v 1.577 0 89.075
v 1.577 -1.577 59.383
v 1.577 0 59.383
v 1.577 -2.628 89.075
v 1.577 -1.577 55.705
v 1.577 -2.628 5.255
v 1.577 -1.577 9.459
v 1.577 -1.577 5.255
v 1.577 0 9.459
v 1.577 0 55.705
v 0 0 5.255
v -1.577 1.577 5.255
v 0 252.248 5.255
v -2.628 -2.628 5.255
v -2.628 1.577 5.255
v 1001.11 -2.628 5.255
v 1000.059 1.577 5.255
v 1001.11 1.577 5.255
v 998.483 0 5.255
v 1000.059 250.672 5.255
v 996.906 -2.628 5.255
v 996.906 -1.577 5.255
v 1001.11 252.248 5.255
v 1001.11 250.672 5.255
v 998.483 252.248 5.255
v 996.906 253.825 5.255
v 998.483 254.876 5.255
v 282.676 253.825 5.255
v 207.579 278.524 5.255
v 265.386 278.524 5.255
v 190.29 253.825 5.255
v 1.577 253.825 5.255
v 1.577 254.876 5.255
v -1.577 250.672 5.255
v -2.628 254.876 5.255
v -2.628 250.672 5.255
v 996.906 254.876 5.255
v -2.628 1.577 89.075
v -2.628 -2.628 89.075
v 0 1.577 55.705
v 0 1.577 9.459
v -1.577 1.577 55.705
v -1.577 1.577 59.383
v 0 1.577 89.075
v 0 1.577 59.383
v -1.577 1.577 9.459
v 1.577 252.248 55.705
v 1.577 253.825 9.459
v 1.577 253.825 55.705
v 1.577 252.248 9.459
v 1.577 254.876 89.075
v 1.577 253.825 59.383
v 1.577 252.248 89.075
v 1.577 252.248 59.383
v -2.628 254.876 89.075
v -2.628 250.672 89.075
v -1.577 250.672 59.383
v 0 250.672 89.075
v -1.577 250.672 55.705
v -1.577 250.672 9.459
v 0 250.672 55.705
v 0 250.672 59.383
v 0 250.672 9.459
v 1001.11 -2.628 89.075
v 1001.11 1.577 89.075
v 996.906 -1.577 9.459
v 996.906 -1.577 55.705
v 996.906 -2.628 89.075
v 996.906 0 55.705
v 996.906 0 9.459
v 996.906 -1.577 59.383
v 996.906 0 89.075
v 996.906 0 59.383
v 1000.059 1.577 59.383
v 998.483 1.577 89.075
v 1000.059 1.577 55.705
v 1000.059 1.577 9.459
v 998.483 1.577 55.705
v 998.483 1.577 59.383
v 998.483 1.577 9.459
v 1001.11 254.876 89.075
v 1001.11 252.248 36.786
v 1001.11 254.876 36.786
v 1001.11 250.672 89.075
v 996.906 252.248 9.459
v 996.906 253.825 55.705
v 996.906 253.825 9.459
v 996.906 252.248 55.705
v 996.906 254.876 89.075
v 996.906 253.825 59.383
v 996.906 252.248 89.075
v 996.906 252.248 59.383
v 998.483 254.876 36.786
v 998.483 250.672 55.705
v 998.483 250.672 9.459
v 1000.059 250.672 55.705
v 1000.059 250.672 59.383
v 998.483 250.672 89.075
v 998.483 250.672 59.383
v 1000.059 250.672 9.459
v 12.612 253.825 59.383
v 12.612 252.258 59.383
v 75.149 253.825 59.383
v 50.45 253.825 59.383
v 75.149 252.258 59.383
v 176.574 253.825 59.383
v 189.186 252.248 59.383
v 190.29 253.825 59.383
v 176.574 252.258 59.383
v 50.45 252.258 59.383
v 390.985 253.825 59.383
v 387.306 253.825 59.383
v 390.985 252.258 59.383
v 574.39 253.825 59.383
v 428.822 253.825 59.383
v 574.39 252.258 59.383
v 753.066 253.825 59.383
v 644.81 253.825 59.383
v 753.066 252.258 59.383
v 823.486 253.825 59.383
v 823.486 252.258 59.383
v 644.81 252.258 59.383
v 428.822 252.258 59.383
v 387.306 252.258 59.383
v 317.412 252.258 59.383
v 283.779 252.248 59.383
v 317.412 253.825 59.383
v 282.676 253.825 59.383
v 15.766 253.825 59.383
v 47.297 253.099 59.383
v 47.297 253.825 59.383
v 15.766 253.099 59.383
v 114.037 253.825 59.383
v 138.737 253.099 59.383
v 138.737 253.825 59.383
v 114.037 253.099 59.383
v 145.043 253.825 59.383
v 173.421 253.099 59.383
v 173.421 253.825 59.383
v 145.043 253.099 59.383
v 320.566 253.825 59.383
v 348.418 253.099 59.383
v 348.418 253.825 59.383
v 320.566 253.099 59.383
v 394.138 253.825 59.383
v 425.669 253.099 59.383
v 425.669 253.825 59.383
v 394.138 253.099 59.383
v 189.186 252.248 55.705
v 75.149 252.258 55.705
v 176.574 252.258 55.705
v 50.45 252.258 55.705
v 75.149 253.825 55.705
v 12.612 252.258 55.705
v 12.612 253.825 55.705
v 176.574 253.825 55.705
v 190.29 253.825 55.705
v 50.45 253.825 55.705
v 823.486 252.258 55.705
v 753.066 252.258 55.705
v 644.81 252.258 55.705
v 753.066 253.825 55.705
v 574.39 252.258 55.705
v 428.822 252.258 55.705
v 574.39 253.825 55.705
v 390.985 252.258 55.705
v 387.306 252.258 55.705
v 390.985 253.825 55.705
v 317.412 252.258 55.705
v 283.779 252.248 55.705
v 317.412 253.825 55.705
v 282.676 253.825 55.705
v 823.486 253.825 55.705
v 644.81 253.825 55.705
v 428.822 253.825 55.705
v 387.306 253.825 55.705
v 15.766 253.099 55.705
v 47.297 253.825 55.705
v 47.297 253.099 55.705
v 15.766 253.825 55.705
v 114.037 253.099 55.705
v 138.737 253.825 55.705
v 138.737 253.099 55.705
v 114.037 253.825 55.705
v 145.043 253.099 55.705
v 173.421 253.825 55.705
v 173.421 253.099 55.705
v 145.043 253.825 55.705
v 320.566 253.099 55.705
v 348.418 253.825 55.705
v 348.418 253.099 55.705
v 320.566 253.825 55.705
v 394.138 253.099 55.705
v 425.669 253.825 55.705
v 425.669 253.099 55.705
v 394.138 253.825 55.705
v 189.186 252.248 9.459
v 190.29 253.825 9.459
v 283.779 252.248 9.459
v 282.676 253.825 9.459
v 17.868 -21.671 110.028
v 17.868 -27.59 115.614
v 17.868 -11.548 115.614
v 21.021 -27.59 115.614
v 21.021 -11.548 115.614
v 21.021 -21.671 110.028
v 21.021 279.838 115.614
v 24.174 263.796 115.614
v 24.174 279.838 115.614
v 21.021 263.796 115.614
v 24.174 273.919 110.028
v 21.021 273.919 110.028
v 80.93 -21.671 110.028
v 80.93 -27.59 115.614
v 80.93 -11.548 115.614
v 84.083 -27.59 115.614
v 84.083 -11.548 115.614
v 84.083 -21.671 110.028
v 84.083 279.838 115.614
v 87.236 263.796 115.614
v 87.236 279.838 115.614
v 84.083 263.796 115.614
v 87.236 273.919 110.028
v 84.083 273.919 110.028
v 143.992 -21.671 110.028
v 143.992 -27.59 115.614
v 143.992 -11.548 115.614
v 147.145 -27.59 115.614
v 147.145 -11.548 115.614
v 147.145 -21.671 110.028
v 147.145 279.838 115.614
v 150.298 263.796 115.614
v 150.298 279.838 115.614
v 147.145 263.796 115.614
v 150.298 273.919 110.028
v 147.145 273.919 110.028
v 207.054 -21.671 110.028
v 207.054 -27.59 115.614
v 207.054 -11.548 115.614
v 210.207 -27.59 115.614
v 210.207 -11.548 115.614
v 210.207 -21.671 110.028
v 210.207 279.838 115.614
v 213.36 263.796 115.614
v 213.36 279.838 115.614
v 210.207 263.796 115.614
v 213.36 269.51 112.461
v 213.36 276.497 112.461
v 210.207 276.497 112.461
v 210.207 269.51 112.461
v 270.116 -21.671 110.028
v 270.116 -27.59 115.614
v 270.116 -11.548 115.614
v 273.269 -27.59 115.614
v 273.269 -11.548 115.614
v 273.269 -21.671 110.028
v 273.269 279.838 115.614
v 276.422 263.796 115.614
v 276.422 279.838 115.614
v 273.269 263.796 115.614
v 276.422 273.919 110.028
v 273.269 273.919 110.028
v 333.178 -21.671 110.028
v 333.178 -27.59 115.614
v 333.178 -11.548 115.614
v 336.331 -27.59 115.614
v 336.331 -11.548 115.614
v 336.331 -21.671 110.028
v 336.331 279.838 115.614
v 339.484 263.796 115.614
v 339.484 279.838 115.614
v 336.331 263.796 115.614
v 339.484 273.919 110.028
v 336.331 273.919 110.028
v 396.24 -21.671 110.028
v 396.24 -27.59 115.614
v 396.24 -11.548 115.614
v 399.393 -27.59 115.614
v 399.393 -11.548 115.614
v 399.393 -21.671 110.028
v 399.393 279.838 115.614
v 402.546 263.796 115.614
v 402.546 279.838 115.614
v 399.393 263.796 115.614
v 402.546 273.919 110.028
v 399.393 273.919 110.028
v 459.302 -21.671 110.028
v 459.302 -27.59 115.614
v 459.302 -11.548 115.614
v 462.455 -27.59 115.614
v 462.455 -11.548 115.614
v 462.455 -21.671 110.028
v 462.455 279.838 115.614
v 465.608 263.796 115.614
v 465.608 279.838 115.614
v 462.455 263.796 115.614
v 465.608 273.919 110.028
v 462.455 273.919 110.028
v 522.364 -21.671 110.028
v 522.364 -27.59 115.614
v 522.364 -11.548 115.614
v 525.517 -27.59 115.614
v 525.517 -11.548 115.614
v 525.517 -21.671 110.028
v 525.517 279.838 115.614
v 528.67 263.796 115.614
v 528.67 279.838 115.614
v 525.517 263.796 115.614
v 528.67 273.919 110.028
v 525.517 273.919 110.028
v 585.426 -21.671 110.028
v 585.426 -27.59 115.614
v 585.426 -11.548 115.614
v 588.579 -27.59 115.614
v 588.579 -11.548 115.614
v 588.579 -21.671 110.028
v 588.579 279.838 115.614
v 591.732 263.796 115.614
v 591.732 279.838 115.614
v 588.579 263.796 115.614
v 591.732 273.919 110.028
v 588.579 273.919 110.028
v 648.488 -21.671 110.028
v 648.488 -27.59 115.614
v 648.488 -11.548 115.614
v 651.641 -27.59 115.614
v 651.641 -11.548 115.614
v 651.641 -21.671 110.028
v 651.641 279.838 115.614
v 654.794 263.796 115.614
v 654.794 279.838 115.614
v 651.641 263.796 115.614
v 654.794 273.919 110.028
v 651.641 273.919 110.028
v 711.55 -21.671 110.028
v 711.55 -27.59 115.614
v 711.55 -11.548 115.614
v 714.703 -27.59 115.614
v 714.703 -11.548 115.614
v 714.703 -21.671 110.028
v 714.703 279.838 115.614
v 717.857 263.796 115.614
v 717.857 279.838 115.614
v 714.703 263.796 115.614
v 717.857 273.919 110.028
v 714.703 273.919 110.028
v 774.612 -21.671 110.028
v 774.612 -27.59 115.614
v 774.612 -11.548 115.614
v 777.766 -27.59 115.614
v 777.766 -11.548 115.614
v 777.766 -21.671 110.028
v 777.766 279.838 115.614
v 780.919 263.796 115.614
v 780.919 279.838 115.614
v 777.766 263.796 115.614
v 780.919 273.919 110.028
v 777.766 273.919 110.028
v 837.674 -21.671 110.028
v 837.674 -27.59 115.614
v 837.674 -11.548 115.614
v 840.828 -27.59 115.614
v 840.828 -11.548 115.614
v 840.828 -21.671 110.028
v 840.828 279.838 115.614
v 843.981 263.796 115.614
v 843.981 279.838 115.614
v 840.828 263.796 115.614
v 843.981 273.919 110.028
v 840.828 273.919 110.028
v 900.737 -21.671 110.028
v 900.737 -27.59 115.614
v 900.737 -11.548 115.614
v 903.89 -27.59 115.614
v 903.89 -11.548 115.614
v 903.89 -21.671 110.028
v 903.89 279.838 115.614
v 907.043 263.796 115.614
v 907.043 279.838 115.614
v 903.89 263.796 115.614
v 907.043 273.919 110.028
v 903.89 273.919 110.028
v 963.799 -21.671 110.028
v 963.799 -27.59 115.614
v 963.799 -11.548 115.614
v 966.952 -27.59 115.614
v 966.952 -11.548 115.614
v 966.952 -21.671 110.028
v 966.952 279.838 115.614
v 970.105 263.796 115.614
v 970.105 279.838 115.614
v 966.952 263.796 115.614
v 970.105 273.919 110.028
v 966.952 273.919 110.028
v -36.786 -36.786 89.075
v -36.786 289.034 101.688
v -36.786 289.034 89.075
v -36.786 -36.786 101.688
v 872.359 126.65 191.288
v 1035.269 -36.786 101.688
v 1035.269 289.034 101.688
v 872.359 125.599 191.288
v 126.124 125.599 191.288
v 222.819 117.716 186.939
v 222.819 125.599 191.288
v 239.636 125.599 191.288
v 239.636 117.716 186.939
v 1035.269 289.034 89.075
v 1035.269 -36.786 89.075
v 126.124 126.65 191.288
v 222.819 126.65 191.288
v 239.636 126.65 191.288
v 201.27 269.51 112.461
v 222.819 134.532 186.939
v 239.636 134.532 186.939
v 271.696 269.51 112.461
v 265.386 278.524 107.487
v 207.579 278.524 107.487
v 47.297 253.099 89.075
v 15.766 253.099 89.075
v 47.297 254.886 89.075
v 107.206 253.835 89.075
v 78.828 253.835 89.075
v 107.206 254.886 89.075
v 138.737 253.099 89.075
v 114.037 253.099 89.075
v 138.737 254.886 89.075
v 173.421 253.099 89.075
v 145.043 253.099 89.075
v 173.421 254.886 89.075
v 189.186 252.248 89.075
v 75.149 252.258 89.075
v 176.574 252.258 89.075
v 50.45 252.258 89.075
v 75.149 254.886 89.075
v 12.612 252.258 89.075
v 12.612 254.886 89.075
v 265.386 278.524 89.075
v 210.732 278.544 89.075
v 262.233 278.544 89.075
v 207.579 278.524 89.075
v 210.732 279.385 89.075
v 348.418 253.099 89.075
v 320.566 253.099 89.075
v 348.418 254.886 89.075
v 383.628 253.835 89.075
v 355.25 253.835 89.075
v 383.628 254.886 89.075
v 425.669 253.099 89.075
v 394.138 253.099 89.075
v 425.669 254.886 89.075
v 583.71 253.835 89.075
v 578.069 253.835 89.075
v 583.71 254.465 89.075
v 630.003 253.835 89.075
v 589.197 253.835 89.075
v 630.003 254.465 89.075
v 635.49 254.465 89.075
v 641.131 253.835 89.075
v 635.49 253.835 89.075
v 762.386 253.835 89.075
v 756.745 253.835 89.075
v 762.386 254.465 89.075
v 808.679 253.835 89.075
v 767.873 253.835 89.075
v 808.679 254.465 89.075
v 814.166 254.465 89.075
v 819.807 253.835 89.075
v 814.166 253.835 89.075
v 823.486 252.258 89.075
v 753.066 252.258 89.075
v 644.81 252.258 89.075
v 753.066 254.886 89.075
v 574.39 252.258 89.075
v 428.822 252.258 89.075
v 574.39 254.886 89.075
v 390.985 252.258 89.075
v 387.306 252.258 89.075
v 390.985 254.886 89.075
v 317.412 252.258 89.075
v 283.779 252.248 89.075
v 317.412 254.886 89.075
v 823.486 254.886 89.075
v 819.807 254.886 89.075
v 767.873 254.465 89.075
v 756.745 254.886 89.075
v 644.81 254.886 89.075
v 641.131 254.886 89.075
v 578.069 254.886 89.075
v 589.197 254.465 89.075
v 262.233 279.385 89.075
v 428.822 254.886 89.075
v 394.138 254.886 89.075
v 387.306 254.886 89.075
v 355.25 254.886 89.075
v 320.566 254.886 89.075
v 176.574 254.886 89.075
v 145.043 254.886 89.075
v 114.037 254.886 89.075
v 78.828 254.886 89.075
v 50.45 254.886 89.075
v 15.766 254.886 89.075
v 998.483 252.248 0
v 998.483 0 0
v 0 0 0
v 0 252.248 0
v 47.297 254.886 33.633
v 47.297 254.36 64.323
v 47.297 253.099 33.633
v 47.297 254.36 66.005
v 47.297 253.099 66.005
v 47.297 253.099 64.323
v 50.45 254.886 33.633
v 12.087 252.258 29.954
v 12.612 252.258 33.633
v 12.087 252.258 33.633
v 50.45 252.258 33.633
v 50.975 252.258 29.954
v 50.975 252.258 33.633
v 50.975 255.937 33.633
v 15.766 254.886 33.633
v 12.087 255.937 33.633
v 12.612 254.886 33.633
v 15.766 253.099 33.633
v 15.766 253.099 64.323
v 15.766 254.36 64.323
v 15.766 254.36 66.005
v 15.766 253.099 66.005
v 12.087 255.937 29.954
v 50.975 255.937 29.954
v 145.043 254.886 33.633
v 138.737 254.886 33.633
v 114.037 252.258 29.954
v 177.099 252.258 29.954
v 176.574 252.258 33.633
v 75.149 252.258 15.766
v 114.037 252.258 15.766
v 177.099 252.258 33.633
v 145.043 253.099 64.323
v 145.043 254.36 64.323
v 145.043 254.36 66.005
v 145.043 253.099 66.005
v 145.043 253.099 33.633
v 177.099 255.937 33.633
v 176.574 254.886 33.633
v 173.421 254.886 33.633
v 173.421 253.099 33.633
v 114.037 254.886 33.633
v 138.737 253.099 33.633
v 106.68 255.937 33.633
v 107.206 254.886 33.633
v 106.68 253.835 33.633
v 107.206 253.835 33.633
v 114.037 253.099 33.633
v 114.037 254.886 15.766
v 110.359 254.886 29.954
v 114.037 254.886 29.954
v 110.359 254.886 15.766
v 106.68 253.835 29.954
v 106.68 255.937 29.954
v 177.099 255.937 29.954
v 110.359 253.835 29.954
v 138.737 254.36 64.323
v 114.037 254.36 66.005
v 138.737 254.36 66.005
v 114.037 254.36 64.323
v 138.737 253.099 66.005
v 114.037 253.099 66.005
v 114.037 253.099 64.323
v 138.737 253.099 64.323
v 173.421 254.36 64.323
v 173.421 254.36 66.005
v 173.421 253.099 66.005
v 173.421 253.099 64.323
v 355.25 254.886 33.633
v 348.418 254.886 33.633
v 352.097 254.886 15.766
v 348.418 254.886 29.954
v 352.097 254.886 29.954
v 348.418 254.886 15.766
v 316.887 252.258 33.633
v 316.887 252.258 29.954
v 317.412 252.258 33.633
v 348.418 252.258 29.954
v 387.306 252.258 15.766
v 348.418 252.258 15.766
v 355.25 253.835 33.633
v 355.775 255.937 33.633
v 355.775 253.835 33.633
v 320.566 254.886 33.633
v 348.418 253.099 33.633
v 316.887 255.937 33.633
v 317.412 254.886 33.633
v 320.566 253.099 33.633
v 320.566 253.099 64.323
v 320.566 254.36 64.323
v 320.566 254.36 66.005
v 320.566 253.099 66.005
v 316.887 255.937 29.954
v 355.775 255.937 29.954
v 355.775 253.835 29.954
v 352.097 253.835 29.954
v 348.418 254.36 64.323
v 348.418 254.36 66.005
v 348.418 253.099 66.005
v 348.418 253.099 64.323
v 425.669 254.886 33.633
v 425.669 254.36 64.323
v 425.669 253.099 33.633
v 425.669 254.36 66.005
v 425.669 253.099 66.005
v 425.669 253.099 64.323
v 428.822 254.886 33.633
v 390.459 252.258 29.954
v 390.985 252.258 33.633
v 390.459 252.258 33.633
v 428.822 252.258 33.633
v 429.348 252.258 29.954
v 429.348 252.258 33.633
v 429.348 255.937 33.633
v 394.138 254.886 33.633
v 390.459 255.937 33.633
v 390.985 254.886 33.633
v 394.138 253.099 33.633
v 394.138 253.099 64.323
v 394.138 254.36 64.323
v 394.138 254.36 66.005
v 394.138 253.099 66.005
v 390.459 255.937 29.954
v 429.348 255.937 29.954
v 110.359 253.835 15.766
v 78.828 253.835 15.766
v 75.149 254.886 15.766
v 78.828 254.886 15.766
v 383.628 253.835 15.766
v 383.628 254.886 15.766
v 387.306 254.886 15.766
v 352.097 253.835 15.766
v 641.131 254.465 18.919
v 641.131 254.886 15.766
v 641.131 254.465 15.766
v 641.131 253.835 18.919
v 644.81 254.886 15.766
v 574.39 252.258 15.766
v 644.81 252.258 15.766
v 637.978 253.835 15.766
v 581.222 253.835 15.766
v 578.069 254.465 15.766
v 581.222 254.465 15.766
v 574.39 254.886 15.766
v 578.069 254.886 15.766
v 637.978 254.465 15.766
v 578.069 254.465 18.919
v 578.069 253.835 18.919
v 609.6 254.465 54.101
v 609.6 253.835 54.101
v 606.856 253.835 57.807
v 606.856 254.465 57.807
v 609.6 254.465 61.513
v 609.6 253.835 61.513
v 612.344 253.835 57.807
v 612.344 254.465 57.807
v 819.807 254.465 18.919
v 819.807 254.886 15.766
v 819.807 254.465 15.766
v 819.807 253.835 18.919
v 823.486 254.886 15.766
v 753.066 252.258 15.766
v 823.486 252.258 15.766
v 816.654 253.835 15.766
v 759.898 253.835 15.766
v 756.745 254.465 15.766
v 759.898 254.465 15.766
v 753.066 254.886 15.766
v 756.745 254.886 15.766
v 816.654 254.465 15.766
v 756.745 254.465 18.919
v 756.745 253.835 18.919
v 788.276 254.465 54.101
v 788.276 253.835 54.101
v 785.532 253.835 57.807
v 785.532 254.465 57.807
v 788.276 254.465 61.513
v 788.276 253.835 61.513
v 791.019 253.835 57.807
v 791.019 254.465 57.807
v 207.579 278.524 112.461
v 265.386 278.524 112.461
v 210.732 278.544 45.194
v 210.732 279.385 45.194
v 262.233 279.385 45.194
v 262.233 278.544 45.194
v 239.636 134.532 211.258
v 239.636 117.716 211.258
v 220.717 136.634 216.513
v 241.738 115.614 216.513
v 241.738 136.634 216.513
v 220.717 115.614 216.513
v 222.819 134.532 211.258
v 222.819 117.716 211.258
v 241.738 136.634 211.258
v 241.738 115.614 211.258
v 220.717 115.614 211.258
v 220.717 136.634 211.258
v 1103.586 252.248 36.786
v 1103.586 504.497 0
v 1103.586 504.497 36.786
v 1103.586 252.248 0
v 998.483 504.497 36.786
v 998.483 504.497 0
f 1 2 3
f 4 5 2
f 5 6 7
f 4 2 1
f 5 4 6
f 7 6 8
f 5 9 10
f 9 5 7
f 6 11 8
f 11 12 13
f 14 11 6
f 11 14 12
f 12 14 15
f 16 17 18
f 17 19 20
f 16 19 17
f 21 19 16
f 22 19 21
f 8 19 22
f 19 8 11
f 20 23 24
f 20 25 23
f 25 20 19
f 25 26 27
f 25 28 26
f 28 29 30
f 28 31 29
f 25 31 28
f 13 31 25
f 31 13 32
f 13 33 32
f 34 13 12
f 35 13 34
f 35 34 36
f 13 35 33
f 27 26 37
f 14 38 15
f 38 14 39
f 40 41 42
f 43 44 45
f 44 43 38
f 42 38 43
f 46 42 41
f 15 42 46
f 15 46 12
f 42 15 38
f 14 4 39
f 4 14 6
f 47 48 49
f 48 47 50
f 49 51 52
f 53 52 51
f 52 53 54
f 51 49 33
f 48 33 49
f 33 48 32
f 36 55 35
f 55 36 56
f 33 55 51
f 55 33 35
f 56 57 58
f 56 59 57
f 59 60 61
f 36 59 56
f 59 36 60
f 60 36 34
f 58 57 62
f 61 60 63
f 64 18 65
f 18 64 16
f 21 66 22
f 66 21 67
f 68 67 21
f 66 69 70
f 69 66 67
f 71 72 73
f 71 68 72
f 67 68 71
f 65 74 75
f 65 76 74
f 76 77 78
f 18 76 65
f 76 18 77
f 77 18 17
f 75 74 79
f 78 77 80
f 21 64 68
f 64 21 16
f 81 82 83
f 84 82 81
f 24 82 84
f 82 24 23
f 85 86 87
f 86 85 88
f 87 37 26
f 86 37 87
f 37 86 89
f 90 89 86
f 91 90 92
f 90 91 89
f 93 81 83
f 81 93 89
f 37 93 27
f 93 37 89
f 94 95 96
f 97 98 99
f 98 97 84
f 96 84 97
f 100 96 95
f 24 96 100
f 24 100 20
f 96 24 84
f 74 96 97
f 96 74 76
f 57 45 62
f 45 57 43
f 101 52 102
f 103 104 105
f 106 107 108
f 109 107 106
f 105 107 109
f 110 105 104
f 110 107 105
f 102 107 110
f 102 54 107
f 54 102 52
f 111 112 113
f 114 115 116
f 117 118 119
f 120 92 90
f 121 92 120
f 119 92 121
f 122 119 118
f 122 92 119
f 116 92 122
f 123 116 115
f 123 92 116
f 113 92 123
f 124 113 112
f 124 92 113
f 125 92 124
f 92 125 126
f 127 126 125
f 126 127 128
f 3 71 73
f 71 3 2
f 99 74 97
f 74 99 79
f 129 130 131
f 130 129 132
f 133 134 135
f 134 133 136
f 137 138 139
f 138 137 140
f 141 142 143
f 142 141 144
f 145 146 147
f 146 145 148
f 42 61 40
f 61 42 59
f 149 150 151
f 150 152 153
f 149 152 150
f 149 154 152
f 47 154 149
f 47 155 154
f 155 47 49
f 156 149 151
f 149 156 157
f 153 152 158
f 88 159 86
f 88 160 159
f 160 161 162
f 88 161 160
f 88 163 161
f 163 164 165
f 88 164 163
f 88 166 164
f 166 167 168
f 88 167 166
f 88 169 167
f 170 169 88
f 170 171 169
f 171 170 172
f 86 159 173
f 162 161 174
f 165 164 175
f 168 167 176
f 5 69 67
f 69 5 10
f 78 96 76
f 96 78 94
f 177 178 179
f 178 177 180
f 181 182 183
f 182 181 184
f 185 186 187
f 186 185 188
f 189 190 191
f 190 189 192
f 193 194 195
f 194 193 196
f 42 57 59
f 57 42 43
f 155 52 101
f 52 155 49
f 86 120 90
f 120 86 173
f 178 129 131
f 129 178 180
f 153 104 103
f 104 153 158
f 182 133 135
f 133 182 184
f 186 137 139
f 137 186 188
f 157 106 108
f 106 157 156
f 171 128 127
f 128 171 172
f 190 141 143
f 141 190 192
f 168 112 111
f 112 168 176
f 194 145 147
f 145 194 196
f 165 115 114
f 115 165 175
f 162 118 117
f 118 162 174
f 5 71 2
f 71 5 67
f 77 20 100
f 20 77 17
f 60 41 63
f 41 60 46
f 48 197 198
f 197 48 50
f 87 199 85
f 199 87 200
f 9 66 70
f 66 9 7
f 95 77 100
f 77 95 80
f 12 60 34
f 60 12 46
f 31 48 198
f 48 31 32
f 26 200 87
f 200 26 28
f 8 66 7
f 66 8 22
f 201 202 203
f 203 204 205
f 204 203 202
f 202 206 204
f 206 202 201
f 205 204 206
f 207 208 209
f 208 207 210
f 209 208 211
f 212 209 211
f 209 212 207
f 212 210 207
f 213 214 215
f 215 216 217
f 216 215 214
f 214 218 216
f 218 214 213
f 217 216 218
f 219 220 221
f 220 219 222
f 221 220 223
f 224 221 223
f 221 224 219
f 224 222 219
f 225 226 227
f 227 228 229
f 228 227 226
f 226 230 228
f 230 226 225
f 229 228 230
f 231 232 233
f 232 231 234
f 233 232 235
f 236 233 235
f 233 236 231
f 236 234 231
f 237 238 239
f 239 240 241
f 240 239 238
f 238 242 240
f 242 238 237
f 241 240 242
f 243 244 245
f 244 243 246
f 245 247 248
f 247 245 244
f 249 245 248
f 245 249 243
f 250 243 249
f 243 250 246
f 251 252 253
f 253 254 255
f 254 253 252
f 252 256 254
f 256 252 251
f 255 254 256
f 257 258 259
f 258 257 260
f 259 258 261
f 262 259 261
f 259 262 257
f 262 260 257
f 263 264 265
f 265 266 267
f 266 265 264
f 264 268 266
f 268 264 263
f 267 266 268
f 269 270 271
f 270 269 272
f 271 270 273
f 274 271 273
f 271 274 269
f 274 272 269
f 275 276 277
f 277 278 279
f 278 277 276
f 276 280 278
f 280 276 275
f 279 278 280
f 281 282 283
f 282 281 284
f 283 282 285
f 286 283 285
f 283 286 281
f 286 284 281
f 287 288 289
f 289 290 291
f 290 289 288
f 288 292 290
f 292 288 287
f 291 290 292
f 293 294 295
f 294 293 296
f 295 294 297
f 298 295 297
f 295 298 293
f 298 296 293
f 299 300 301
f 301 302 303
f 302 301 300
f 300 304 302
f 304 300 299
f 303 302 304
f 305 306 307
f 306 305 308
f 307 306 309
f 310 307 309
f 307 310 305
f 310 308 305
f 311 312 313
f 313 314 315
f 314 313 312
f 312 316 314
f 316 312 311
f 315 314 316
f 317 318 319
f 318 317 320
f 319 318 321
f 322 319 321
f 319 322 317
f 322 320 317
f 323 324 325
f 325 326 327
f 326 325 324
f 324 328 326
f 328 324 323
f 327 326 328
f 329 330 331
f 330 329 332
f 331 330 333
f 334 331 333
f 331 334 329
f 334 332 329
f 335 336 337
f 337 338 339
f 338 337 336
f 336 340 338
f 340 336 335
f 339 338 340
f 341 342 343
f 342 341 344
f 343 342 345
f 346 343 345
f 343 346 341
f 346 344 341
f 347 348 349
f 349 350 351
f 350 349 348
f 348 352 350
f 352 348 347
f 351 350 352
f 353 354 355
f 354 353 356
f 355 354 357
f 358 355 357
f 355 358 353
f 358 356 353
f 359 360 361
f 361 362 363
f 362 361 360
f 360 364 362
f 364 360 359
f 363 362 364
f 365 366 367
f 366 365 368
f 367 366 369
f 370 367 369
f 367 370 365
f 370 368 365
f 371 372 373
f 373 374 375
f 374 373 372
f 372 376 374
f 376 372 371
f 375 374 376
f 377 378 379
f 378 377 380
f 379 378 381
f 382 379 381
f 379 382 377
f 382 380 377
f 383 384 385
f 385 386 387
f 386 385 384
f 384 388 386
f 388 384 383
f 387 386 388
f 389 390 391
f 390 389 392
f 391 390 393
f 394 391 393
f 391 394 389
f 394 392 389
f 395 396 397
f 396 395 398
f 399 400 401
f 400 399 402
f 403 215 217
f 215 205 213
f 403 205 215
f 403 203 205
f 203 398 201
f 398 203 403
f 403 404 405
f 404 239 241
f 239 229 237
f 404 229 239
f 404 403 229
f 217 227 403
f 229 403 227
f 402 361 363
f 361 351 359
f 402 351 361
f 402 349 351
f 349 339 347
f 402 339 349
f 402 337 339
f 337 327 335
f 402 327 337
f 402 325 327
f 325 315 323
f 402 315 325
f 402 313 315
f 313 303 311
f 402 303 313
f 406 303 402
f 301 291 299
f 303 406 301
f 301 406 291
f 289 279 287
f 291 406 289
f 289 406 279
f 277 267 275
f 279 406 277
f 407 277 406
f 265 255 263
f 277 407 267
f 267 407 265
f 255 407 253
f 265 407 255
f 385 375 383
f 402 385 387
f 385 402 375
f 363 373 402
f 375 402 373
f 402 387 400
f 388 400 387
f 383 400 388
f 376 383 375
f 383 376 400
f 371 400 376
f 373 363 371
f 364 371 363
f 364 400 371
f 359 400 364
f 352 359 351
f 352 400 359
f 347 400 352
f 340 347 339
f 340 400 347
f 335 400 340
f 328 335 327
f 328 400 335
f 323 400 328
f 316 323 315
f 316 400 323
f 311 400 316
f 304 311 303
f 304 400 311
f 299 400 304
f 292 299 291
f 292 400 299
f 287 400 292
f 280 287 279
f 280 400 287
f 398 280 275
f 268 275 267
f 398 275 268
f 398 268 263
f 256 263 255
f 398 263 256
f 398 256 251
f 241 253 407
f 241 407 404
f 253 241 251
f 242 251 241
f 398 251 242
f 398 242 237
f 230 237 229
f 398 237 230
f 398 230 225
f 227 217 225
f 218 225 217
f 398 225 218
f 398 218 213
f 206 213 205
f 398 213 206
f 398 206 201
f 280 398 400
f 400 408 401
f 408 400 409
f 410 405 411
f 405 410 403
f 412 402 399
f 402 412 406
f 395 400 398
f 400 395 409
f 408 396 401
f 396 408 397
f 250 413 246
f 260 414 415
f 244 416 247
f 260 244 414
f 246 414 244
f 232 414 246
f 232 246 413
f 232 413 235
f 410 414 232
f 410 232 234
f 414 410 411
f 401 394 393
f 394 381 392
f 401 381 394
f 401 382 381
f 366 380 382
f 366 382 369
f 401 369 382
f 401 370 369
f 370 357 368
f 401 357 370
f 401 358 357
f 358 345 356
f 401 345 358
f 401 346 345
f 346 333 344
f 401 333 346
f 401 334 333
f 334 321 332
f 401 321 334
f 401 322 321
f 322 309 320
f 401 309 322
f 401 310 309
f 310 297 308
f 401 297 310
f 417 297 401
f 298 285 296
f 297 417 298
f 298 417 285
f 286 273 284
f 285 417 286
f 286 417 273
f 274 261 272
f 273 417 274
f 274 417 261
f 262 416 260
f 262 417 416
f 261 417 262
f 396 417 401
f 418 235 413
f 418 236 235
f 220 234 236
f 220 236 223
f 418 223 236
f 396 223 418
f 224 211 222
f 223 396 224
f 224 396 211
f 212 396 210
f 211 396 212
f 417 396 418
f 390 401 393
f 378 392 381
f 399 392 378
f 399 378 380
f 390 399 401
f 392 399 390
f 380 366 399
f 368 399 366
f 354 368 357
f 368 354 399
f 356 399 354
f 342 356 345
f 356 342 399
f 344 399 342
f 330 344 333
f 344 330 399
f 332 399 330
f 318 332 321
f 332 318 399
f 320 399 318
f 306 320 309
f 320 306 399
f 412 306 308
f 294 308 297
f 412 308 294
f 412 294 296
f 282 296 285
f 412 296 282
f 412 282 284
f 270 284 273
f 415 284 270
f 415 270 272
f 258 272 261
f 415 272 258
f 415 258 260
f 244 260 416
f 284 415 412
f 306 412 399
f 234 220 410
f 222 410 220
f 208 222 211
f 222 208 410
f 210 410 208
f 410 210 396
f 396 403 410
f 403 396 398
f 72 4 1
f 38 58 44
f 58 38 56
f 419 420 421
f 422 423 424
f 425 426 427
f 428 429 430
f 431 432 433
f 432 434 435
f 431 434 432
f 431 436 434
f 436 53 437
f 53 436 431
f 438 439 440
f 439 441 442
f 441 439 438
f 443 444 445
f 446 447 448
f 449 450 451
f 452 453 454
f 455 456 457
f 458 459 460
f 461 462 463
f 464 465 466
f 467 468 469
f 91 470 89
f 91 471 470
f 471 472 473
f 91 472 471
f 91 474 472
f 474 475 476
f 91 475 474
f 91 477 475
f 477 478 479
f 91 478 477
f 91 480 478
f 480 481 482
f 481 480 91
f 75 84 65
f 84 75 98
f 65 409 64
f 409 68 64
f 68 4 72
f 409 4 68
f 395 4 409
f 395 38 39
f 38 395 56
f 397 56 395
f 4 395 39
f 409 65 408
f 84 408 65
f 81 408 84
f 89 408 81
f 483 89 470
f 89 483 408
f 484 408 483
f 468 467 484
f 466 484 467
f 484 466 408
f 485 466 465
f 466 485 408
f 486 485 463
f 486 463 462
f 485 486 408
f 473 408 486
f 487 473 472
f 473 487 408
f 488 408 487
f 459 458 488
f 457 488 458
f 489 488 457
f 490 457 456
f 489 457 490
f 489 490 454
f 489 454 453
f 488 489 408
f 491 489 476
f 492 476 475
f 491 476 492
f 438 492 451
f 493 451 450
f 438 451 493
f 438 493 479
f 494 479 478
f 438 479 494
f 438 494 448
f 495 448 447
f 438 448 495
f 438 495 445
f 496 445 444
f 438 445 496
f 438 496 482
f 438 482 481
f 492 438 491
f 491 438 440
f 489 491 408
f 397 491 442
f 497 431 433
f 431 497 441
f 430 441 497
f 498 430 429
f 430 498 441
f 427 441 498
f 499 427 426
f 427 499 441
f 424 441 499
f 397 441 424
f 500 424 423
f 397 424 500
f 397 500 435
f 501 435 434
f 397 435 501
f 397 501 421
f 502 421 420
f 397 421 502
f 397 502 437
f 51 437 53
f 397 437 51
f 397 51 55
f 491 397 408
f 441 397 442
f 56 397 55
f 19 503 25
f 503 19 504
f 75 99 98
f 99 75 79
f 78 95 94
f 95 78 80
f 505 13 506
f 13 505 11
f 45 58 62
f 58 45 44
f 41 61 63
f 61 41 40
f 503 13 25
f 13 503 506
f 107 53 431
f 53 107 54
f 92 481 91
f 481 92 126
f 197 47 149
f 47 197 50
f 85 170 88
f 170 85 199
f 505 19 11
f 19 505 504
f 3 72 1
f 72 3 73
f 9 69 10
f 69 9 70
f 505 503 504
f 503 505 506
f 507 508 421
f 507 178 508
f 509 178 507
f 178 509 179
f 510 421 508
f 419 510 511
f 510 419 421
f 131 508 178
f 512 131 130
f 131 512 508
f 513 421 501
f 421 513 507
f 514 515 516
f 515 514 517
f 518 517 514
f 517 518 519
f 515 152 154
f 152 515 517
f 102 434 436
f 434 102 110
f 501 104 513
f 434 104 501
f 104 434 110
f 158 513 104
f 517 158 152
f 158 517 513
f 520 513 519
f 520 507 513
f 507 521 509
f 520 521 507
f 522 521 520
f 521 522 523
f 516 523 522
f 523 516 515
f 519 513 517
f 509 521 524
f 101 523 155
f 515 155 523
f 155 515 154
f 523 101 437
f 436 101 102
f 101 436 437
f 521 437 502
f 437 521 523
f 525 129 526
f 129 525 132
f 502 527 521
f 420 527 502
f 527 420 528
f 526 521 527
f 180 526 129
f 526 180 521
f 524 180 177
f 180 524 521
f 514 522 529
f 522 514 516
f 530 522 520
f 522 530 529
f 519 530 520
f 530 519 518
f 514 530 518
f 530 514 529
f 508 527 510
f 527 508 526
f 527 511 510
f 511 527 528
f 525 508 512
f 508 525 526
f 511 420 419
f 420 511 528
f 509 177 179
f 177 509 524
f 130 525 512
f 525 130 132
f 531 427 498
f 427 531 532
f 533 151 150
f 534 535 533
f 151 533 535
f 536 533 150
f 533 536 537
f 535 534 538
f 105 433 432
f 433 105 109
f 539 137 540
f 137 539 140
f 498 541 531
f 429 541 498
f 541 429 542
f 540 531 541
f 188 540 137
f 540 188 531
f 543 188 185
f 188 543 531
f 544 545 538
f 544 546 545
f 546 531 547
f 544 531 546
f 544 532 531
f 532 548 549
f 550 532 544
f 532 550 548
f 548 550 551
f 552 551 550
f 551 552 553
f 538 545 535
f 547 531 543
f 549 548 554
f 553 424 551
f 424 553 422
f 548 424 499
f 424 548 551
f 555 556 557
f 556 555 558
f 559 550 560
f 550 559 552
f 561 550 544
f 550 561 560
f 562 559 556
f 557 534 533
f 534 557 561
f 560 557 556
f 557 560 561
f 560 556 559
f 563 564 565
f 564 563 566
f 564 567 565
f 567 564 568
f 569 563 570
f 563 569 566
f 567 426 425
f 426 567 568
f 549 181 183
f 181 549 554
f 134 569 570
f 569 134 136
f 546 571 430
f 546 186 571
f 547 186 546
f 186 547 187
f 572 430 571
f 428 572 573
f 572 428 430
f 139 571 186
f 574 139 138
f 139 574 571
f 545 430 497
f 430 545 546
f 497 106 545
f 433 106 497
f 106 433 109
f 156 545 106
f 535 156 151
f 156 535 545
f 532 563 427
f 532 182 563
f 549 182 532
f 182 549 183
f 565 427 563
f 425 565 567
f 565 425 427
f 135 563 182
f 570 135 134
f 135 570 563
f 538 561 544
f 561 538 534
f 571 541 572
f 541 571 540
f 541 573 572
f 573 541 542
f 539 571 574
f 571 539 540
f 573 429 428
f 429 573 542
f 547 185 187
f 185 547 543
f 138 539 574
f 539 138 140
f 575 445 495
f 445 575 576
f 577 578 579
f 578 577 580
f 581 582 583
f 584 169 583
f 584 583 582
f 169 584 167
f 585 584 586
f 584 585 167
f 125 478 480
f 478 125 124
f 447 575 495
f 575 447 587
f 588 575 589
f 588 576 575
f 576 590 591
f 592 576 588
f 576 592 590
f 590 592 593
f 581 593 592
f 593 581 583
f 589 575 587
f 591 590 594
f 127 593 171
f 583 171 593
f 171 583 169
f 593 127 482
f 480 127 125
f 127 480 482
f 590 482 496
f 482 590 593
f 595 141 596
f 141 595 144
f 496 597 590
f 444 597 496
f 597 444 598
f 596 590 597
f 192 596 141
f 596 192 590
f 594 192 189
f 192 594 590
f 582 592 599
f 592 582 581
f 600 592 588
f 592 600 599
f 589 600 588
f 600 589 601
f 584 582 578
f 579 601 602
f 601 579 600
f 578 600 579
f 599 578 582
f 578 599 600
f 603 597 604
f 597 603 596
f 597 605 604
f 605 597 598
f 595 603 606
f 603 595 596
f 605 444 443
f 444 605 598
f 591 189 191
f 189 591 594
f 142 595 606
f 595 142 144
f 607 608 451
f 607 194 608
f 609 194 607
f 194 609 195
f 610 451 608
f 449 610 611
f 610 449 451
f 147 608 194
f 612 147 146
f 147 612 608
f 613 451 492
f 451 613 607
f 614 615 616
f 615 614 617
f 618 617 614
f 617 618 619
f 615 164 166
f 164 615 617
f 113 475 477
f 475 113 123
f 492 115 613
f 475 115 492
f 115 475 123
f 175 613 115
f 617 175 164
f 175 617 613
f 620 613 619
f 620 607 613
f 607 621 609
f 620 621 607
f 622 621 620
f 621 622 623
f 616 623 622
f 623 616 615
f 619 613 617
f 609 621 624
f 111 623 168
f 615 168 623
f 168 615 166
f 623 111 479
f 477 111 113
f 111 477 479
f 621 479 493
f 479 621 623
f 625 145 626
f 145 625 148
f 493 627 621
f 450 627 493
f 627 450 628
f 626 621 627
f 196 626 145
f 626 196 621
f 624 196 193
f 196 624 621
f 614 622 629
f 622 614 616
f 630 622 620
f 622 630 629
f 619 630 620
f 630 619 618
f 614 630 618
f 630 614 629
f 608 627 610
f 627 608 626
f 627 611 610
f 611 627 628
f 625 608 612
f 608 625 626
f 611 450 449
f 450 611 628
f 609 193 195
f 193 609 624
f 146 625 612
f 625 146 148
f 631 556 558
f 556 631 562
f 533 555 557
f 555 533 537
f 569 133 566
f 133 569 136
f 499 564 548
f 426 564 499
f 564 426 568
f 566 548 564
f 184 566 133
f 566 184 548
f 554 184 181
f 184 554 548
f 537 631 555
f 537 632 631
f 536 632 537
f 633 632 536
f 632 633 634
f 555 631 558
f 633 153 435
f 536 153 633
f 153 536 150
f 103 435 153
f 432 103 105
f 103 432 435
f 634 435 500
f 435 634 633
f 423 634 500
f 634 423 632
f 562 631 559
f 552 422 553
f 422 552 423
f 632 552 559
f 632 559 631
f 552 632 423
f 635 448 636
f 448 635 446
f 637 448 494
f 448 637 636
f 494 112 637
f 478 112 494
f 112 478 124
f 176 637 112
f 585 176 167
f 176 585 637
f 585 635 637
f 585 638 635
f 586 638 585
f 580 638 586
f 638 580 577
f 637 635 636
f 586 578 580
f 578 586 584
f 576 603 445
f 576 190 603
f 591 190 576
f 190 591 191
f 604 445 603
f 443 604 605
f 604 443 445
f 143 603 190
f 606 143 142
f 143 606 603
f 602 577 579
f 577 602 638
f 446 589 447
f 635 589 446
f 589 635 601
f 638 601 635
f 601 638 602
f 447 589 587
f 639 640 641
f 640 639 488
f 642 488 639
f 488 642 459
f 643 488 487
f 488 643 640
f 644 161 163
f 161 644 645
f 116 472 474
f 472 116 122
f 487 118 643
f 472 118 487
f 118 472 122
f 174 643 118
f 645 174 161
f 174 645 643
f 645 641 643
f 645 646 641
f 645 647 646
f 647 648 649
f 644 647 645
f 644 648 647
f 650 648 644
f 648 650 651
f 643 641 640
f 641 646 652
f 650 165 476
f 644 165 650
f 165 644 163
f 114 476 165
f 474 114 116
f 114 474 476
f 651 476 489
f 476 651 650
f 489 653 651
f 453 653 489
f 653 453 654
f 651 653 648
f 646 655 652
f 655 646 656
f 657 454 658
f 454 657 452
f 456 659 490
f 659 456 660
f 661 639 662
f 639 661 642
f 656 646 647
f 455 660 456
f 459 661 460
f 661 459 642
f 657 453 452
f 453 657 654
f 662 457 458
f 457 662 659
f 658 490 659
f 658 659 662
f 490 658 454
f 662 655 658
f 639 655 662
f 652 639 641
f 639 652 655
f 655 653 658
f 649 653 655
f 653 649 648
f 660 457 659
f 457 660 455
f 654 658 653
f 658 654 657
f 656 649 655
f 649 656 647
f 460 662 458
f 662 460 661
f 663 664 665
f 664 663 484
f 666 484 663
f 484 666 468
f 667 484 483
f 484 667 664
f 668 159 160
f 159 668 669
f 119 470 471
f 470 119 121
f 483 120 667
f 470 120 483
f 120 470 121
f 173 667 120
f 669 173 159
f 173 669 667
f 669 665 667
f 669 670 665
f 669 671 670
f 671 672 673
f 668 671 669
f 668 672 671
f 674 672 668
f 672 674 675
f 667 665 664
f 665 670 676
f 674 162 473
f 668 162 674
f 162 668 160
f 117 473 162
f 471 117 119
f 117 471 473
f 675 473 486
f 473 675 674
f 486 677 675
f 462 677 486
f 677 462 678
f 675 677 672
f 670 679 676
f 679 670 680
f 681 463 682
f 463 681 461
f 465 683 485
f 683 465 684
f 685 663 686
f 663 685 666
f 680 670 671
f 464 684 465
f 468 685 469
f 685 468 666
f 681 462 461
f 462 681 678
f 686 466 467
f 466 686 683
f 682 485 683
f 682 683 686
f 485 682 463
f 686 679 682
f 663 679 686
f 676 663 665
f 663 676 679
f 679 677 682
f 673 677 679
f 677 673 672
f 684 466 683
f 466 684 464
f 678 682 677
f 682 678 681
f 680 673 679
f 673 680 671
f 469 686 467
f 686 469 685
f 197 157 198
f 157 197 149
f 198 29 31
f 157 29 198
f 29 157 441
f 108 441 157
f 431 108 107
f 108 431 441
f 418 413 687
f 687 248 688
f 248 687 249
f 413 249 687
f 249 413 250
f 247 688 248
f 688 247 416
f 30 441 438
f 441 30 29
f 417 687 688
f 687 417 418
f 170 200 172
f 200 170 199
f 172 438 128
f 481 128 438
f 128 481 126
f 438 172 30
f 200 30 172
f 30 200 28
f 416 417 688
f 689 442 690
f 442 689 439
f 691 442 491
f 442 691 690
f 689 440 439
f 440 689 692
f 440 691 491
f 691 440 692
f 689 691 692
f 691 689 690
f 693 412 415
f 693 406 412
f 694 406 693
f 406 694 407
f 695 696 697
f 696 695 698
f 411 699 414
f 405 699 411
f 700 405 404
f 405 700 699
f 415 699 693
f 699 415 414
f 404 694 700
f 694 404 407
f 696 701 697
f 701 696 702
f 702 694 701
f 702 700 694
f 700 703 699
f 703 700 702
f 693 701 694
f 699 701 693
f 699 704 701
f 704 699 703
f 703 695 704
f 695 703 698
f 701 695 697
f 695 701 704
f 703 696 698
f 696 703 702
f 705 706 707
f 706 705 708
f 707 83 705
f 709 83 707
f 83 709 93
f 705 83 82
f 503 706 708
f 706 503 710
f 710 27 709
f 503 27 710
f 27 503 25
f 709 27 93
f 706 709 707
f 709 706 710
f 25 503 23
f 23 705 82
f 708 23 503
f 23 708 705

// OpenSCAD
// =====================================================================
//  MILWAUKEE ROAD - STANDARD 24 X 95 FT DEPOT, COON RAPIDS (C.M.&ST.P., NOV 1898)
//  Album of Depot Plans (1919), sheet 19. Private reference (in copyright):
//  Research Library / RSW / Stations / Standard depots / Album of Depot Plans 1919.
//  Rib Side Works, 24 Nov 2026. FIRST SHAPE MODEL for review - not cut into print sections.
//  KNOWN (from the sheet): 24 x 95 ft; two waiting rooms 17, office 11 with bay, baggage room 10, freight room 48 (low and high floors) with a high platform; hipped shingle roof with cresting, lap siding over drop siding.
//  ESTIMATE: wall and ridge heights (sheets are small copies), window spacing, colours.
//  Shared depot builder ../../../_common/rsw_depot.scad (x along the track, y = 0 town side,
//  track side +y, feet).  SCALE: 29 = G, 48 = O, 87 = HO.
// =====================================================================
SCALE = 29;
include <../../../_common/rsw_depot.scad>

depot(blocks = [[0, 95, 0, 24, 11, 0.55, 0, 3.5, 0]],
      pavs   = [],
      wins   = [[3, 1, 3, 6, 3.2], [12, 1, 3, 6, 3.2], [15, 1, 3, 6, 3.2], [32, 1, 3, 6, 3.2], [39, 1, 3, 6, 3.2]],
      doors  = [[9, 1, 3, 7.5, 0], [35, 1, 3, 7.5, 0], [58, 1, 6, 8, 2], [75, 1, 6, 8, 2]],
      bays   = [[22.5, 1, 9, 2.5]],
      chims  = [[22, 12, 20.6]],
      plat   = [95, 10, 24, 3.5]);
